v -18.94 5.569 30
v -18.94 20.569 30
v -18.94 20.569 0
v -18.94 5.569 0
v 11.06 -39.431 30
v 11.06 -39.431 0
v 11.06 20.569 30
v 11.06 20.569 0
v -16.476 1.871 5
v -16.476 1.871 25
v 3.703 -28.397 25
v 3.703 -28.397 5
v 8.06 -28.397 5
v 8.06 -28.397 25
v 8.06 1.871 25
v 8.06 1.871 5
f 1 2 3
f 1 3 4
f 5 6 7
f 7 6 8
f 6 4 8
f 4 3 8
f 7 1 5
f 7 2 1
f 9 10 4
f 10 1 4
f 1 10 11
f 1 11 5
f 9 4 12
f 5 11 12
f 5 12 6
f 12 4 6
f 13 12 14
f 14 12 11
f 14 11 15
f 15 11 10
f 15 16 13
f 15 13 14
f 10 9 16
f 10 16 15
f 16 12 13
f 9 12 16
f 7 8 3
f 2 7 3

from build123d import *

# Parameters (mm, degrees)
EXTRUDE_1_DEPTH     = 30
SKETCH_2_W          = 20
SKETCH_2_H          = 30.268482551
CUT_EXTRUDE_1_DEPTH = 27


with BuildPart() as part:
    # 草圖1 → 填料-伸長1 (new body)
    with BuildSketch(Plane.XY):
        Polygon((-18.940316301, 5.568561873), (11.059683699, -39.431438127), (11.059683699, 20.568561873), (-18.940316301, 20.568561873), align=None)
    extrude(amount=EXTRUDE_1_DEPTH)

    # 草圖2 → 除料-伸長1 (cut)
    with BuildSketch(Plane.ZY.offset(18.940316301)):
        with Locations((15, -13.262891615)):
            Rectangle(SKETCH_2_W, SKETCH_2_H)
    extrude(amount=-CUT_EXTRUDE_1_DEPTH, mode=Mode.SUBTRACT)


solid = part.part
